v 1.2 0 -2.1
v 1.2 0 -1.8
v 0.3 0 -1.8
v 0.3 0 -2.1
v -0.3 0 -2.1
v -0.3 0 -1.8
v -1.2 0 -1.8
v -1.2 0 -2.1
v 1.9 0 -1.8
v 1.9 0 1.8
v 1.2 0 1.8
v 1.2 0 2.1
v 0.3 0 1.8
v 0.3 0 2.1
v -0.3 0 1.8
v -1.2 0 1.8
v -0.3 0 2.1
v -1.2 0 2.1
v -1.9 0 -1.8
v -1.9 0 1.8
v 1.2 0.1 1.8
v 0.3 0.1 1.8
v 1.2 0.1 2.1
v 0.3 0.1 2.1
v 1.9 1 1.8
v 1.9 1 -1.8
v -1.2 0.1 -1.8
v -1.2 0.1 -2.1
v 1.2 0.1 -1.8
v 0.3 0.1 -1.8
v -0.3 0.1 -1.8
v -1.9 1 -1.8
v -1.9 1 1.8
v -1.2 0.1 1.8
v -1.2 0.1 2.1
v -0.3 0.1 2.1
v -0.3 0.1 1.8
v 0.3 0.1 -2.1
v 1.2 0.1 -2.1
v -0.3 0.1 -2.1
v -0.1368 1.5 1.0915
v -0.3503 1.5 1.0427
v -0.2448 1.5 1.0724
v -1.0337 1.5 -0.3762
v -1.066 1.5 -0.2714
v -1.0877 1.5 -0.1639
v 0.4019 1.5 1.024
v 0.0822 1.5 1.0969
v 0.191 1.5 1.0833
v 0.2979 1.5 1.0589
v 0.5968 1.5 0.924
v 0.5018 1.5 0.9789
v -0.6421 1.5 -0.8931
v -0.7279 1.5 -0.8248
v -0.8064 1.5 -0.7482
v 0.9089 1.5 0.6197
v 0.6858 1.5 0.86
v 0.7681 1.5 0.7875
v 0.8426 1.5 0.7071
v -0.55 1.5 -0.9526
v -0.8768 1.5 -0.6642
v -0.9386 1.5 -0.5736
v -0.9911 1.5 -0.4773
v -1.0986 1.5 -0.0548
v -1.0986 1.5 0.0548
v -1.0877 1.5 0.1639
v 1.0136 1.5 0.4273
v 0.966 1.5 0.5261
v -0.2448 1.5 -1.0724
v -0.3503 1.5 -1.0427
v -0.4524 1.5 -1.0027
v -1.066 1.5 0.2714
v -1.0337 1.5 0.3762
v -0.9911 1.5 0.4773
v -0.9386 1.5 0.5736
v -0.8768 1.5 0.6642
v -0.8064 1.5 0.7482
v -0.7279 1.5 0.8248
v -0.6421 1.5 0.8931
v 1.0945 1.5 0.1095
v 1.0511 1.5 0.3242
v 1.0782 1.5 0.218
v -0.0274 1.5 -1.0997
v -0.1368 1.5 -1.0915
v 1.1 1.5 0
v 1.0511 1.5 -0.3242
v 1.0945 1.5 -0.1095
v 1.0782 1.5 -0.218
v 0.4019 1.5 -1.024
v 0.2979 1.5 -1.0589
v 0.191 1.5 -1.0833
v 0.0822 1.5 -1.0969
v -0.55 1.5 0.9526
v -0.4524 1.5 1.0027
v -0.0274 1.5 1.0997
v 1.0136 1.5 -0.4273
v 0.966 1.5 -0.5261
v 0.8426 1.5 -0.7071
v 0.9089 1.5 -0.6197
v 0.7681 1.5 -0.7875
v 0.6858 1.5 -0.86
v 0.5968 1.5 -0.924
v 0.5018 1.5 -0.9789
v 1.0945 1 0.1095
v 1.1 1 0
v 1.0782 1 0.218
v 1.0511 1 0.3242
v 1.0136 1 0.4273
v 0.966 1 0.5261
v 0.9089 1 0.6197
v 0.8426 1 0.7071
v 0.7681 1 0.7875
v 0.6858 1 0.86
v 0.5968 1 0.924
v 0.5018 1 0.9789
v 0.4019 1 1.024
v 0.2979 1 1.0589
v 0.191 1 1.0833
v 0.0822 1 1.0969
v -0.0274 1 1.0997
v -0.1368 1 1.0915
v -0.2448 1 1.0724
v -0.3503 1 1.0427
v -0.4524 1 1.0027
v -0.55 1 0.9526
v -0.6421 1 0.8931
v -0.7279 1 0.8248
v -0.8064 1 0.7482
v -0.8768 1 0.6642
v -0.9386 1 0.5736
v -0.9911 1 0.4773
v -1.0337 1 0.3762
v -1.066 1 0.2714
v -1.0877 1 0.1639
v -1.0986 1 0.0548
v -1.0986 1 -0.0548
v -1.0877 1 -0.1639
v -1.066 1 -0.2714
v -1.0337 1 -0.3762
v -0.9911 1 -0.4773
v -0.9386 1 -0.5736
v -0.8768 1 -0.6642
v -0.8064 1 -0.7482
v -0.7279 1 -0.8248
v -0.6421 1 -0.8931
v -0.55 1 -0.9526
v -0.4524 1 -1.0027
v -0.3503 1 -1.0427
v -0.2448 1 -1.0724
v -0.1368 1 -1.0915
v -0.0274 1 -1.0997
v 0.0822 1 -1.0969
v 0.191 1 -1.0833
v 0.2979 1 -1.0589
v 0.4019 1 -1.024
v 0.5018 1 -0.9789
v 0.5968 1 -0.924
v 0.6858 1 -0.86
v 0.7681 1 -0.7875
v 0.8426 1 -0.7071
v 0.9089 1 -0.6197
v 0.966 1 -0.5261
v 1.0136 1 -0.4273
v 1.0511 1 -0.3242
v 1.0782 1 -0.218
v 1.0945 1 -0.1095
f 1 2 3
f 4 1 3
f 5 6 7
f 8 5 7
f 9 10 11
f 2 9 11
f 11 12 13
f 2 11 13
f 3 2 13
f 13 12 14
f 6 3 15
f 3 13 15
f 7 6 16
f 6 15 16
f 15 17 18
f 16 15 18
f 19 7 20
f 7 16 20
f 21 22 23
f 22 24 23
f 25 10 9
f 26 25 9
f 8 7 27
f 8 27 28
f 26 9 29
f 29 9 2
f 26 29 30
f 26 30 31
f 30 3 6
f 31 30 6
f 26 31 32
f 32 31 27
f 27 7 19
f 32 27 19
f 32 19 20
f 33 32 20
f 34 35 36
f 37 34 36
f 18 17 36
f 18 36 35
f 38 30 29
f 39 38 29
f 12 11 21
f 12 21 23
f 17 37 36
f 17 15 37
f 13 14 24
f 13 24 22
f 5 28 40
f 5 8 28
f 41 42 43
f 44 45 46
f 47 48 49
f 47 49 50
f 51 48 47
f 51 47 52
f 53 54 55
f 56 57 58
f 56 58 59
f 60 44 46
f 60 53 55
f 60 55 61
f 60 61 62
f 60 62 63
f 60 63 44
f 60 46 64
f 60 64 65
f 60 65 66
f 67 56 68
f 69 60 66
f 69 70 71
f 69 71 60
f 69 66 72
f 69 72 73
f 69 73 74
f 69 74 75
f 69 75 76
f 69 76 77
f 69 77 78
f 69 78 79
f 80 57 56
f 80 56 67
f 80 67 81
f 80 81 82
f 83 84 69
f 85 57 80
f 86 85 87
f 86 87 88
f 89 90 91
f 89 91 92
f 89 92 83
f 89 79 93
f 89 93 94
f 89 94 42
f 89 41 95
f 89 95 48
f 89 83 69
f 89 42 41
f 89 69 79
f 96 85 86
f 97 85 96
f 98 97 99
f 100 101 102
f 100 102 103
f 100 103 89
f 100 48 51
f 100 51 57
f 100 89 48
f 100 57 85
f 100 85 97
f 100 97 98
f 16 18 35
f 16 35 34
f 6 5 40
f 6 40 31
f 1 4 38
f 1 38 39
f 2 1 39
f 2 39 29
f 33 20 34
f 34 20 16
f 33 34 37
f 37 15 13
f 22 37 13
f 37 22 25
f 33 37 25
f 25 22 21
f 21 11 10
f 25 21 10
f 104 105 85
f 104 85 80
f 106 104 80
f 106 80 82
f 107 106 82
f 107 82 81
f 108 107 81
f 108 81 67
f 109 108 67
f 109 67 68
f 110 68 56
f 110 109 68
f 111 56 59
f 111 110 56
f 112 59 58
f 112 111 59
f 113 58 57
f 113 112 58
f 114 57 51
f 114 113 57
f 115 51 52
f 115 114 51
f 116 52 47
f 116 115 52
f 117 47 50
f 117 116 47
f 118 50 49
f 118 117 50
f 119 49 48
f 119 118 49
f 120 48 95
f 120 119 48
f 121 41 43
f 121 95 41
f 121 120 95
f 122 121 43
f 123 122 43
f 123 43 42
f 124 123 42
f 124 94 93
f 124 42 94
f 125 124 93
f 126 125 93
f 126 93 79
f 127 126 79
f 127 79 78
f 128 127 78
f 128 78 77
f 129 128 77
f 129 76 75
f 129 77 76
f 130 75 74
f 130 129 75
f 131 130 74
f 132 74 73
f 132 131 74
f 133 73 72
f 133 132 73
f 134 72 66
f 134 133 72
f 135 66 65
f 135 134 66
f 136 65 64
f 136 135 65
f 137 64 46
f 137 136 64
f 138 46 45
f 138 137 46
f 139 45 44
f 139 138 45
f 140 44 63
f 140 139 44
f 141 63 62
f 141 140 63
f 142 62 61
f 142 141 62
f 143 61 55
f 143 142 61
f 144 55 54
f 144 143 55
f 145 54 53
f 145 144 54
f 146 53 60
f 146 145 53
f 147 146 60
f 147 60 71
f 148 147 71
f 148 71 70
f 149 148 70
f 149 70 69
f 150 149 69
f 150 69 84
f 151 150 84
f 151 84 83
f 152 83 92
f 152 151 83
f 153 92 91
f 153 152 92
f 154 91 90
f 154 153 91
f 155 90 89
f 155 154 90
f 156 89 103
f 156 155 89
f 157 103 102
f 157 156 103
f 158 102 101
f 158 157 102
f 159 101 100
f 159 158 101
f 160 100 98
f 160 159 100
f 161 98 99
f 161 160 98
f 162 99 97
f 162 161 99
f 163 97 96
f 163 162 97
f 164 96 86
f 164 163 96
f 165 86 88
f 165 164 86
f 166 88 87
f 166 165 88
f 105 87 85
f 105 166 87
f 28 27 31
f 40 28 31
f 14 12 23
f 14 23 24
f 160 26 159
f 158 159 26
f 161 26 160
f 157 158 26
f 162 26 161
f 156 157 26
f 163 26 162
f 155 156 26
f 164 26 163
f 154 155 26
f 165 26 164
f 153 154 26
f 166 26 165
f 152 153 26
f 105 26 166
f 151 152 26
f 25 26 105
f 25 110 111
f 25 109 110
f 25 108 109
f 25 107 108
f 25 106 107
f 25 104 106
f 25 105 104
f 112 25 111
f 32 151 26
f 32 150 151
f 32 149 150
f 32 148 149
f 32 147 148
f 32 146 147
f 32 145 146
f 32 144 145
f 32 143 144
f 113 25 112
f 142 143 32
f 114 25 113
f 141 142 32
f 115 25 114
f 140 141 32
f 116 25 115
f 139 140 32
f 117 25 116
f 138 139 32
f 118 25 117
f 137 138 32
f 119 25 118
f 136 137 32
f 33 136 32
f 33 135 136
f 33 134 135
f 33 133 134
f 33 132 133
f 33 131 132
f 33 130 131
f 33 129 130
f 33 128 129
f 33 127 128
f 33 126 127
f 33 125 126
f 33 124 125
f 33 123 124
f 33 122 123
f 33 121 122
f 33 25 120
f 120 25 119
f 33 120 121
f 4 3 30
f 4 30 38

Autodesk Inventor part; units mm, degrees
ref_plane "YZ Plane" through (0, 0, 0) normal (1, 0, 0) x (0, 1, 0)
ref_plane "XZ Plane" through (0, 0, 0) normal (0, 1, 0) x (-1, 0, 0)
ref_plane "XY Plane" through (0, 0, 0) normal (0, 0, 1) x (1, 0, 0)
sketch "Sketch1" plane through (0, 0, 0) normal (0, 1, 0) x (-1, 0, 0)
  line L0 (1.9, 1.8) -> (-1.9, 1.8)
  line L1 (-1.9, 1.8) -> (-1.9, -1.8)
  line L2 (-1.9, -1.8) -> (1.9, -1.8)
  line L3 (1.9, -1.8) -> (1.9, 1.8)
  line L4 (2.66, 0) -> (-2.66, 0) construction
  line L5 (0, -2.52) -> (0, 2.52) construction
  point P0 (0, 0)
  dimension "d0" = 3.8
  dimension "d1" = 3.6
extrude "Extrusion1" add sketch "Sketch1" along normal blind 1
sketch "Sketch2" plane through (0, 1, 0) normal (0, 1, 0) x (1, 0, 0)
  circle A0 centre (0, 0) radius 1.1
  dimension "d4" = 2.2
extrude "Extrusion2" add sketch "Sketch2" along normal blind 0.5
sketch "Sketch3" plane through (0, 0, 0) normal (0, -1, 0) x (1, 0, 0)
  line L0 (1.2, -1.6) -> (0.3, -1.6)
  line L1 (0.3, -1.6) -> (0.3, -2.1)
  line L2 (0.3, -2.1) -> (1.2, -2.1)
  line L3 (1.2, -2.1) -> (1.2, -1.6)
  line L4 (-0.3, -1.6) -> (-1.2, -1.6)
  line L5 (-1.2, -1.6) -> (-1.2, -2.1)
  line L6 (-1.2, -2.1) -> (-0.3, -2.1)
  line L7 (-0.3, -2.1) -> (-0.3, -1.6)
  line L8 (1.2, 2.1) -> (0.3, 2.1)
  line L9 (0.3, 2.1) -> (0.3, 1.6)
  line L10 (0.3, 1.6) -> (1.2, 1.6)
  line L11 (1.2, 1.6) -> (1.2, 2.1)
  line L12 (-0.3, 2.1) -> (-1.2, 2.1)
  line L13 (-1.2, 2.1) -> (-1.2, 1.6)
  line L14 (-1.2, 1.6) -> (-0.3, 1.6)
  line L15 (-0.3, 1.6) -> (-0.3, 2.1)
  point P0 (0, 0)
  dimension "d7" = 3.2
  dimension "d8" = 4.2
  dimension "d9" = 0.5
  dimension "d10" = 0.6
  dimension "d11" = 2.4
  dimension "d12" = 1.6
  dimension "d13" = 0.3
extrude "Extrusion3" add sketch "Sketch3" against normal blind 0.1
equation "\"d9\" = -0.5 * d7 + 0.5 * d8"
equation "\"d12\" = 0.5 * d7"
equation "\"d13\" = 0.5 * d10"
properties part number "R-667842_tactile_switch"
